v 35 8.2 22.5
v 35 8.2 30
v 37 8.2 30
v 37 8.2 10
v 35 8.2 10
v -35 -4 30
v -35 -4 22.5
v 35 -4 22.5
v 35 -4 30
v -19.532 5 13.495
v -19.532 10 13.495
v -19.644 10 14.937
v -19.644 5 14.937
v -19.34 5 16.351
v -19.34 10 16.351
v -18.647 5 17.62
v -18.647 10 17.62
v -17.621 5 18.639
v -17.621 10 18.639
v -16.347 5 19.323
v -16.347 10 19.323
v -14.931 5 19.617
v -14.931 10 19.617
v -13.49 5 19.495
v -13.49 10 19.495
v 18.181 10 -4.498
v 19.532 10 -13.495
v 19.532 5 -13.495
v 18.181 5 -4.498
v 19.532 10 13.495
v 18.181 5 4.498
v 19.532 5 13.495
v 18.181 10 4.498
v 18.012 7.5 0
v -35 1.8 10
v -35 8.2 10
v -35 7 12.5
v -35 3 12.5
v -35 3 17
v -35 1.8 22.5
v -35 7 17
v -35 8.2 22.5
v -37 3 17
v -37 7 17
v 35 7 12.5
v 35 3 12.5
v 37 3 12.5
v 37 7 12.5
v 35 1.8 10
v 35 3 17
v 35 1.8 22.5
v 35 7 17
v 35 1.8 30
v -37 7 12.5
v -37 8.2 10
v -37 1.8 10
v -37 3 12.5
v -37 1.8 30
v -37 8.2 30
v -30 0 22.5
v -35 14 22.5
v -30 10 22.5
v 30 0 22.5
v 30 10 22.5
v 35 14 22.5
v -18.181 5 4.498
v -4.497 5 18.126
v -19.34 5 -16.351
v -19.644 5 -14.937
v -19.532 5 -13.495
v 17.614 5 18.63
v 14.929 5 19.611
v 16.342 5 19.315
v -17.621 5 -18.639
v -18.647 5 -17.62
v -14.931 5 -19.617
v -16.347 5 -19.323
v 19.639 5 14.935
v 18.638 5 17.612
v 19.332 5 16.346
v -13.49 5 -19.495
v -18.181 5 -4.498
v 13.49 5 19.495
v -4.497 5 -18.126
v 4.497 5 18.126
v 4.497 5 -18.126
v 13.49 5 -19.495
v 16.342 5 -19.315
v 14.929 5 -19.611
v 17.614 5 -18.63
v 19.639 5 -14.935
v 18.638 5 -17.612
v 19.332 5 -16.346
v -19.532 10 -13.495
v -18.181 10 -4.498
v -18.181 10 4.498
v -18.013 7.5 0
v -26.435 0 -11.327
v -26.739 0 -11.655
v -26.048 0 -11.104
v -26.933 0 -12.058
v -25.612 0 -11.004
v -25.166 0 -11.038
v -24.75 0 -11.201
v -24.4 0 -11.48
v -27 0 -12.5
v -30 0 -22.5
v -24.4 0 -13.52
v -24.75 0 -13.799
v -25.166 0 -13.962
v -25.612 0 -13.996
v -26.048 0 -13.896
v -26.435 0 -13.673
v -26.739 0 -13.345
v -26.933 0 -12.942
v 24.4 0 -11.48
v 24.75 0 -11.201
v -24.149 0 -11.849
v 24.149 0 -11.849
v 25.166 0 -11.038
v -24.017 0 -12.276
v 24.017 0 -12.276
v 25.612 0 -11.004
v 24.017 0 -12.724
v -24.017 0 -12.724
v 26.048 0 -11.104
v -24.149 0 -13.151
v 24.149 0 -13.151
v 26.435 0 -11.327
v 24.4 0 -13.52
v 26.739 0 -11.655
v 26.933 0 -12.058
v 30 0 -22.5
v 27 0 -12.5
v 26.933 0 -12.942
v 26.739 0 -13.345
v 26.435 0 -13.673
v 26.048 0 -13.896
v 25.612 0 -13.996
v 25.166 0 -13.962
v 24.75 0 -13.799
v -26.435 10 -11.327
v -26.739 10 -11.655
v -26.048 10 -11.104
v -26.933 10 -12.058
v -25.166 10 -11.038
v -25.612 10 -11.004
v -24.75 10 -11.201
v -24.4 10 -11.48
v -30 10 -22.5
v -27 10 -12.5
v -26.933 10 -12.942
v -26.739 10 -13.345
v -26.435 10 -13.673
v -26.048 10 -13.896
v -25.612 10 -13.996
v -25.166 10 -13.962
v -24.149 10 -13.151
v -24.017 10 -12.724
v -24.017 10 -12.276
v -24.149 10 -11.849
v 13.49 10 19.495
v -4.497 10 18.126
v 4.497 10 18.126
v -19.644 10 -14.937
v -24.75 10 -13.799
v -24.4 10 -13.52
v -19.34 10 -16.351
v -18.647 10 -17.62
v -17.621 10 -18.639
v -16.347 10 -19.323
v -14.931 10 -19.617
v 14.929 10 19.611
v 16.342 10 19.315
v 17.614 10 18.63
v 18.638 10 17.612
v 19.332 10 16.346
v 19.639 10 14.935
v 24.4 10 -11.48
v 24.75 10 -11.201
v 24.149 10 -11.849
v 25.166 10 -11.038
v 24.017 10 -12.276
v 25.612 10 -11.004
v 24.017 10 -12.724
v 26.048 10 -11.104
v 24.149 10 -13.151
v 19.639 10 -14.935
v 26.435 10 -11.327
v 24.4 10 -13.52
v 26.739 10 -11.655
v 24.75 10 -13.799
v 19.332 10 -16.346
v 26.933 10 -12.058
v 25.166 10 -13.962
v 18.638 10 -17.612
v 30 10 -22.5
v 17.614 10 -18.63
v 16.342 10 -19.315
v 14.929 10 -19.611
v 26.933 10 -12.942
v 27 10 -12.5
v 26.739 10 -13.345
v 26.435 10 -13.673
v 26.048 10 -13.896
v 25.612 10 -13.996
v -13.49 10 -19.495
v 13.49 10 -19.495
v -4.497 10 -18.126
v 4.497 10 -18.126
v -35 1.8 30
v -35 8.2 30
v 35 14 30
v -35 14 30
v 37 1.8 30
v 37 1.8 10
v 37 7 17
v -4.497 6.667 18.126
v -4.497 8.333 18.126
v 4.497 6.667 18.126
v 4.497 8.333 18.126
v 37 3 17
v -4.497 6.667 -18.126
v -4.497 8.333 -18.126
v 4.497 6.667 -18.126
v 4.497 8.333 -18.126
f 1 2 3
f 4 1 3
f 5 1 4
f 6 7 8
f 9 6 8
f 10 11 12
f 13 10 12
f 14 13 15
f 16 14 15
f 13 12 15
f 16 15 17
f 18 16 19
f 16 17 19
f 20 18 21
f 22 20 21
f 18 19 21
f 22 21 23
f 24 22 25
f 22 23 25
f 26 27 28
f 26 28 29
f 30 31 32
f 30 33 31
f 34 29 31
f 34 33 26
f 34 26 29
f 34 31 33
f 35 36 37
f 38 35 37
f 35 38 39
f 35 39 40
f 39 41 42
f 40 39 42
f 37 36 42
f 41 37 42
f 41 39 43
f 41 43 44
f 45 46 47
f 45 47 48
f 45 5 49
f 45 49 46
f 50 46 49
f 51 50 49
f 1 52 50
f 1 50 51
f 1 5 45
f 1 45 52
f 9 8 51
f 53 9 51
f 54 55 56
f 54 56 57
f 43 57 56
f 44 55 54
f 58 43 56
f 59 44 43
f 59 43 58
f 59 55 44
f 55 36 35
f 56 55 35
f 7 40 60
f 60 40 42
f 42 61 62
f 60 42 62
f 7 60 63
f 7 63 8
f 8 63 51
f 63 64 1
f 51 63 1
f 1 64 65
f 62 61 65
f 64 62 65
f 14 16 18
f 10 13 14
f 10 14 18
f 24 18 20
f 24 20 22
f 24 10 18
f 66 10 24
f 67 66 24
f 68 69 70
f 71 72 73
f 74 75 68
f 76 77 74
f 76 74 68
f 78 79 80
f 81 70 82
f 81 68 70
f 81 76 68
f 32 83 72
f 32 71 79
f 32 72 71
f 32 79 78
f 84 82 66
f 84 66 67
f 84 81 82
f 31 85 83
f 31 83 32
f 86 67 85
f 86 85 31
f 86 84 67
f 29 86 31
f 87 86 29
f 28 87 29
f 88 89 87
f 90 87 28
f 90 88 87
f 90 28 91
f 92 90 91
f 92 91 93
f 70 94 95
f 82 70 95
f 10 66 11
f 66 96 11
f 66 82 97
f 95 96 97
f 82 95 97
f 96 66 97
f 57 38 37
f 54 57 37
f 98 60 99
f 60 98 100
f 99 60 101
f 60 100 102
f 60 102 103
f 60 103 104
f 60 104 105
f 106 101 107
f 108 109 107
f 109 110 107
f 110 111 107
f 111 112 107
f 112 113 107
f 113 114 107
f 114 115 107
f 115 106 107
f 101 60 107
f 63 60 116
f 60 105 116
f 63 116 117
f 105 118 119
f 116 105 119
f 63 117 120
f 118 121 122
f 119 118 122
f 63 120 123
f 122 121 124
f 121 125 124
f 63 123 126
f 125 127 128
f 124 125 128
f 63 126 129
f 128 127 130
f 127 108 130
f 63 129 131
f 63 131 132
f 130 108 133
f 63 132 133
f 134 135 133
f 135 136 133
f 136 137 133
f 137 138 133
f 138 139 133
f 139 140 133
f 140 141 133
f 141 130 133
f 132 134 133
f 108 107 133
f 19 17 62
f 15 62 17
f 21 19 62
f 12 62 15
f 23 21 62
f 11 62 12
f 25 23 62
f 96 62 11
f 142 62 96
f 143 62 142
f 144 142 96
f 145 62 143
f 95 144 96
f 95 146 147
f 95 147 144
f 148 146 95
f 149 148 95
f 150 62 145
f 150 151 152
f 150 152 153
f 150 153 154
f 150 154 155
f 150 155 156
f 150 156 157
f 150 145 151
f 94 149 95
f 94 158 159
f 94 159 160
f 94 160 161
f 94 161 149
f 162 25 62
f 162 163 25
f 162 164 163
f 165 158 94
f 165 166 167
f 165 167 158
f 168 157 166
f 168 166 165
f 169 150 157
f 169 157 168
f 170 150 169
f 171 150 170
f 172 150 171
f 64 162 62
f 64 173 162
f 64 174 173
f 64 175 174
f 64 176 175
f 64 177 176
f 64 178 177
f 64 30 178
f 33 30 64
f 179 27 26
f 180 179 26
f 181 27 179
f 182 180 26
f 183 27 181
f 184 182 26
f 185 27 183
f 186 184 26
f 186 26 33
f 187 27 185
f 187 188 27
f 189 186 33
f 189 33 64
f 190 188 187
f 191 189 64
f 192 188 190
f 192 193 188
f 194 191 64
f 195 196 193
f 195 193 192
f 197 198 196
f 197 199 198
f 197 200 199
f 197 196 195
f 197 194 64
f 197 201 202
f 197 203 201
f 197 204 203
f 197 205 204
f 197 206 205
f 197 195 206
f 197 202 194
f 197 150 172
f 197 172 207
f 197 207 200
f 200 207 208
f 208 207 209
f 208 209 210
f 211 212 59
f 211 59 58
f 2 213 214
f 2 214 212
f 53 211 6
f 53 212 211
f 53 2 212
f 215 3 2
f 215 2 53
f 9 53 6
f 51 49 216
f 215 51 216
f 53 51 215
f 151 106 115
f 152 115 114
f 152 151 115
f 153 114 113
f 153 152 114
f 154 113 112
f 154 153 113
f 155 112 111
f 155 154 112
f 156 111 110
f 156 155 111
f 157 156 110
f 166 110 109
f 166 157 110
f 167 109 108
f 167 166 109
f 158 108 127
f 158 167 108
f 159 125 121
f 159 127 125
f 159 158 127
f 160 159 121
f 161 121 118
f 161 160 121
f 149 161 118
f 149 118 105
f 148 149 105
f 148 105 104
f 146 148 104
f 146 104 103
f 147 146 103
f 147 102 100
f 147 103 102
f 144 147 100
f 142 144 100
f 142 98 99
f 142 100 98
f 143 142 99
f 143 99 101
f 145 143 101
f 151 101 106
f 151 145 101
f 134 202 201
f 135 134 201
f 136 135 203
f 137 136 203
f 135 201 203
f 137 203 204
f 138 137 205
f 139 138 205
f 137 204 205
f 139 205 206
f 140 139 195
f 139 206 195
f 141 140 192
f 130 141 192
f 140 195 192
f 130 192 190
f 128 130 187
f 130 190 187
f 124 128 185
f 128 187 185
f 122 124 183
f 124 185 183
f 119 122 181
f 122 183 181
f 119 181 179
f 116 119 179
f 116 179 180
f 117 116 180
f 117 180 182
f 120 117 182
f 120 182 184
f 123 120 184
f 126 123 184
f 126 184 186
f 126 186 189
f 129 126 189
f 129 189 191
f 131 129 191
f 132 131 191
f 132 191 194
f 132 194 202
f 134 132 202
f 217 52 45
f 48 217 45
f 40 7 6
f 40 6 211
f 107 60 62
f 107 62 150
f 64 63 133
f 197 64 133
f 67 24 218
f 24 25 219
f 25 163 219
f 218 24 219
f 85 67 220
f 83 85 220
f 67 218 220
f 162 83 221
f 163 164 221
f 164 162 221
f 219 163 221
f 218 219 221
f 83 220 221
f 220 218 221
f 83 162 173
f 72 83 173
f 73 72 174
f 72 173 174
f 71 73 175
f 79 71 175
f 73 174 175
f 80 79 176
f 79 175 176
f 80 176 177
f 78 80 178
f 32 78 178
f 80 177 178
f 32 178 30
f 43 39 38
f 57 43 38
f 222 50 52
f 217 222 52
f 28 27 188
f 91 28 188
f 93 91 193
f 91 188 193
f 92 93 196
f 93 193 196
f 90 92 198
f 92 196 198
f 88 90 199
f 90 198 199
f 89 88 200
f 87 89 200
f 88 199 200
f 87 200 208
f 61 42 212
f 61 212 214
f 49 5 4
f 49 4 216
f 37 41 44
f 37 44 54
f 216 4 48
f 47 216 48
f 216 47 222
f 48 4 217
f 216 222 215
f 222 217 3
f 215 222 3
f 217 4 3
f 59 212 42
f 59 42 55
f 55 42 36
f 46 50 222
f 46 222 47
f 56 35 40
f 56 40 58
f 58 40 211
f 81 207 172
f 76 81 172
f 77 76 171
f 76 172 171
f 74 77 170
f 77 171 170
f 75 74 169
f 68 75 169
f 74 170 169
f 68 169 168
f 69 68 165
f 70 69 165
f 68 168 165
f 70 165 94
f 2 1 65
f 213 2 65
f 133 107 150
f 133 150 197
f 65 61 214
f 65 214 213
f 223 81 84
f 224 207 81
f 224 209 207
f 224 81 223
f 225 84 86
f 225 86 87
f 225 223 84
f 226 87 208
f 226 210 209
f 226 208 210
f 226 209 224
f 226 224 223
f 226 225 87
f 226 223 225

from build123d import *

# Parameters (mm, degrees)
SKETCH1_W           = 60
SKETCH1_H           = 45
BOSS_EXTRUDE1_DEPTH = 10
SKETCH2_W           = 70
SKETCH2_H           = 18
BOSS_EXTRUDE2_DEPTH = 7.5
CUT_EXTRUDE1_DEPTH  = 5
SKETCH4_W           = 4.5
SKETCH4_H           = 4
BOSS_EXTRUDE3_DEPTH = 2
SKETCH5_R           = 1.5
CUT_EXTRUDE2_DEPTH  = 15


with BuildPart() as part:
    # Sketch1 → Boss-Extrude1 (new body)
    with BuildSketch(Plane(origin=(0, 0, 0), x_dir=(1, 0, 0), z_dir=(0, 1, 0))):
        Rectangle(SKETCH1_W, SKETCH1_H)
    extrude(amount=BOSS_EXTRUDE1_DEPTH)

    # Sketch2 → Boss-Extrude2 (add)
    with BuildSketch(Plane.XY.offset(22.5)):
        with Locations((0, 5)):
            Rectangle(SKETCH2_W, SKETCH2_H)
    extrude(amount=BOSS_EXTRUDE2_DEPTH)

    # Sketch3 → Cut-Extrude1 (cut)
    with BuildSketch(Plane(origin=(0, 10, 0), x_dir=(1, 0, 0), z_dir=(0, 1, 0))):
        with BuildLine():
            ThreePointArc((-19.5325, -13.495), (-18.170661955, -18.166166123), (-13.49, -19.495))
            add(Edge.make_bspline(
                [(-13.49, -19.495), (-4.496666667, -17.441666667), (4.496666667, -17.441666667), (13.49, -19.495)],
                knots=[0, 0, 0, 0, 1, 1, 1, 1], degree=3))
            ThreePointArc((13.49, -19.495), (18.162524477, -18.157971004), (19.5325, -13.495))
            add(Edge.make_bspline(
                [(19.5325, 13.495), (16.4925, 0), (19.5325, -13.495)],
                knots=[0, 0, 0, 1, 1, 1], degree=2))
            ThreePointArc((19.5325, 13.495), (18.162524477, 18.157971004), (13.49, 19.495))
            add(Edge.make_bspline(
                [(-13.49, 19.495), (-4.496666667, 17.441666667), (4.496666667, 17.441666667), (13.49, 19.495)],
                knots=[0, 0, 0, 0, 1, 1, 1, 1], degree=3))
            ThreePointArc((-13.49, 19.495), (-18.170661955, 18.166166123), (-19.5325, 13.495))
            add(Edge.make_bspline(
                [(-19.5325, 13.495), (-18.519166667, 8.996666667), (-17.505833333, 0), (-18.519166667, -8.996666667), (-19.5325, -13.495)],
                knots=[0, 0, 0, 0, 0.5, 1, 1, 1, 1], degree=3))
        make_face()
    extrude(amount=-CUT_EXTRUDE1_DEPTH, mode=Mode.SUBTRACT)

    # Sketch4 → Boss-Extrude3 (add)
    with BuildSketch(Plane(origin=(35, 0, 0), x_dir=(0, 0, -1), z_dir=(1, 0, 0))):
        Polygon((-30, 5), (-30, 8.2), (-10, 8.2), (-10, 1.8), (-30, 1.8), align=None)
        with Locations((-14.75, 5)):
            Rectangle(SKETCH4_W, SKETCH4_H, mode=Mode.SUBTRACT)
    boss_extrude3 = extrude(amount=BOSS_EXTRUDE3_DEPTH)

    # Mirror1: Boss-Extrude3 across plane
    add(boss_extrude3.mirror(Plane(origin=(0, 0, 0), x_dir=(0, 0, 1), z_dir=(1, 0, 0))))

    # Sketch5 → Cut-Extrude2 (cut, through all)
    with BuildSketch(Plane(origin=(0, 10, 0), x_dir=(1, 0, 0), z_dir=(0, 1, 0))):
        with Locations((25.5, 12.5)):
            Circle(SKETCH5_R)
    cut_extrude2 = extrude(amount=-CUT_EXTRUDE2_DEPTH, mode=Mode.SUBTRACT)

    # Mirror2: Cut-Extrude2 across plane
    add(cut_extrude2.mirror(Plane(origin=(0, 0, 0), x_dir=(0, 0, 1), z_dir=(1, 0, 0))), mode=Mode.SUBTRACT)


solid = part.part
